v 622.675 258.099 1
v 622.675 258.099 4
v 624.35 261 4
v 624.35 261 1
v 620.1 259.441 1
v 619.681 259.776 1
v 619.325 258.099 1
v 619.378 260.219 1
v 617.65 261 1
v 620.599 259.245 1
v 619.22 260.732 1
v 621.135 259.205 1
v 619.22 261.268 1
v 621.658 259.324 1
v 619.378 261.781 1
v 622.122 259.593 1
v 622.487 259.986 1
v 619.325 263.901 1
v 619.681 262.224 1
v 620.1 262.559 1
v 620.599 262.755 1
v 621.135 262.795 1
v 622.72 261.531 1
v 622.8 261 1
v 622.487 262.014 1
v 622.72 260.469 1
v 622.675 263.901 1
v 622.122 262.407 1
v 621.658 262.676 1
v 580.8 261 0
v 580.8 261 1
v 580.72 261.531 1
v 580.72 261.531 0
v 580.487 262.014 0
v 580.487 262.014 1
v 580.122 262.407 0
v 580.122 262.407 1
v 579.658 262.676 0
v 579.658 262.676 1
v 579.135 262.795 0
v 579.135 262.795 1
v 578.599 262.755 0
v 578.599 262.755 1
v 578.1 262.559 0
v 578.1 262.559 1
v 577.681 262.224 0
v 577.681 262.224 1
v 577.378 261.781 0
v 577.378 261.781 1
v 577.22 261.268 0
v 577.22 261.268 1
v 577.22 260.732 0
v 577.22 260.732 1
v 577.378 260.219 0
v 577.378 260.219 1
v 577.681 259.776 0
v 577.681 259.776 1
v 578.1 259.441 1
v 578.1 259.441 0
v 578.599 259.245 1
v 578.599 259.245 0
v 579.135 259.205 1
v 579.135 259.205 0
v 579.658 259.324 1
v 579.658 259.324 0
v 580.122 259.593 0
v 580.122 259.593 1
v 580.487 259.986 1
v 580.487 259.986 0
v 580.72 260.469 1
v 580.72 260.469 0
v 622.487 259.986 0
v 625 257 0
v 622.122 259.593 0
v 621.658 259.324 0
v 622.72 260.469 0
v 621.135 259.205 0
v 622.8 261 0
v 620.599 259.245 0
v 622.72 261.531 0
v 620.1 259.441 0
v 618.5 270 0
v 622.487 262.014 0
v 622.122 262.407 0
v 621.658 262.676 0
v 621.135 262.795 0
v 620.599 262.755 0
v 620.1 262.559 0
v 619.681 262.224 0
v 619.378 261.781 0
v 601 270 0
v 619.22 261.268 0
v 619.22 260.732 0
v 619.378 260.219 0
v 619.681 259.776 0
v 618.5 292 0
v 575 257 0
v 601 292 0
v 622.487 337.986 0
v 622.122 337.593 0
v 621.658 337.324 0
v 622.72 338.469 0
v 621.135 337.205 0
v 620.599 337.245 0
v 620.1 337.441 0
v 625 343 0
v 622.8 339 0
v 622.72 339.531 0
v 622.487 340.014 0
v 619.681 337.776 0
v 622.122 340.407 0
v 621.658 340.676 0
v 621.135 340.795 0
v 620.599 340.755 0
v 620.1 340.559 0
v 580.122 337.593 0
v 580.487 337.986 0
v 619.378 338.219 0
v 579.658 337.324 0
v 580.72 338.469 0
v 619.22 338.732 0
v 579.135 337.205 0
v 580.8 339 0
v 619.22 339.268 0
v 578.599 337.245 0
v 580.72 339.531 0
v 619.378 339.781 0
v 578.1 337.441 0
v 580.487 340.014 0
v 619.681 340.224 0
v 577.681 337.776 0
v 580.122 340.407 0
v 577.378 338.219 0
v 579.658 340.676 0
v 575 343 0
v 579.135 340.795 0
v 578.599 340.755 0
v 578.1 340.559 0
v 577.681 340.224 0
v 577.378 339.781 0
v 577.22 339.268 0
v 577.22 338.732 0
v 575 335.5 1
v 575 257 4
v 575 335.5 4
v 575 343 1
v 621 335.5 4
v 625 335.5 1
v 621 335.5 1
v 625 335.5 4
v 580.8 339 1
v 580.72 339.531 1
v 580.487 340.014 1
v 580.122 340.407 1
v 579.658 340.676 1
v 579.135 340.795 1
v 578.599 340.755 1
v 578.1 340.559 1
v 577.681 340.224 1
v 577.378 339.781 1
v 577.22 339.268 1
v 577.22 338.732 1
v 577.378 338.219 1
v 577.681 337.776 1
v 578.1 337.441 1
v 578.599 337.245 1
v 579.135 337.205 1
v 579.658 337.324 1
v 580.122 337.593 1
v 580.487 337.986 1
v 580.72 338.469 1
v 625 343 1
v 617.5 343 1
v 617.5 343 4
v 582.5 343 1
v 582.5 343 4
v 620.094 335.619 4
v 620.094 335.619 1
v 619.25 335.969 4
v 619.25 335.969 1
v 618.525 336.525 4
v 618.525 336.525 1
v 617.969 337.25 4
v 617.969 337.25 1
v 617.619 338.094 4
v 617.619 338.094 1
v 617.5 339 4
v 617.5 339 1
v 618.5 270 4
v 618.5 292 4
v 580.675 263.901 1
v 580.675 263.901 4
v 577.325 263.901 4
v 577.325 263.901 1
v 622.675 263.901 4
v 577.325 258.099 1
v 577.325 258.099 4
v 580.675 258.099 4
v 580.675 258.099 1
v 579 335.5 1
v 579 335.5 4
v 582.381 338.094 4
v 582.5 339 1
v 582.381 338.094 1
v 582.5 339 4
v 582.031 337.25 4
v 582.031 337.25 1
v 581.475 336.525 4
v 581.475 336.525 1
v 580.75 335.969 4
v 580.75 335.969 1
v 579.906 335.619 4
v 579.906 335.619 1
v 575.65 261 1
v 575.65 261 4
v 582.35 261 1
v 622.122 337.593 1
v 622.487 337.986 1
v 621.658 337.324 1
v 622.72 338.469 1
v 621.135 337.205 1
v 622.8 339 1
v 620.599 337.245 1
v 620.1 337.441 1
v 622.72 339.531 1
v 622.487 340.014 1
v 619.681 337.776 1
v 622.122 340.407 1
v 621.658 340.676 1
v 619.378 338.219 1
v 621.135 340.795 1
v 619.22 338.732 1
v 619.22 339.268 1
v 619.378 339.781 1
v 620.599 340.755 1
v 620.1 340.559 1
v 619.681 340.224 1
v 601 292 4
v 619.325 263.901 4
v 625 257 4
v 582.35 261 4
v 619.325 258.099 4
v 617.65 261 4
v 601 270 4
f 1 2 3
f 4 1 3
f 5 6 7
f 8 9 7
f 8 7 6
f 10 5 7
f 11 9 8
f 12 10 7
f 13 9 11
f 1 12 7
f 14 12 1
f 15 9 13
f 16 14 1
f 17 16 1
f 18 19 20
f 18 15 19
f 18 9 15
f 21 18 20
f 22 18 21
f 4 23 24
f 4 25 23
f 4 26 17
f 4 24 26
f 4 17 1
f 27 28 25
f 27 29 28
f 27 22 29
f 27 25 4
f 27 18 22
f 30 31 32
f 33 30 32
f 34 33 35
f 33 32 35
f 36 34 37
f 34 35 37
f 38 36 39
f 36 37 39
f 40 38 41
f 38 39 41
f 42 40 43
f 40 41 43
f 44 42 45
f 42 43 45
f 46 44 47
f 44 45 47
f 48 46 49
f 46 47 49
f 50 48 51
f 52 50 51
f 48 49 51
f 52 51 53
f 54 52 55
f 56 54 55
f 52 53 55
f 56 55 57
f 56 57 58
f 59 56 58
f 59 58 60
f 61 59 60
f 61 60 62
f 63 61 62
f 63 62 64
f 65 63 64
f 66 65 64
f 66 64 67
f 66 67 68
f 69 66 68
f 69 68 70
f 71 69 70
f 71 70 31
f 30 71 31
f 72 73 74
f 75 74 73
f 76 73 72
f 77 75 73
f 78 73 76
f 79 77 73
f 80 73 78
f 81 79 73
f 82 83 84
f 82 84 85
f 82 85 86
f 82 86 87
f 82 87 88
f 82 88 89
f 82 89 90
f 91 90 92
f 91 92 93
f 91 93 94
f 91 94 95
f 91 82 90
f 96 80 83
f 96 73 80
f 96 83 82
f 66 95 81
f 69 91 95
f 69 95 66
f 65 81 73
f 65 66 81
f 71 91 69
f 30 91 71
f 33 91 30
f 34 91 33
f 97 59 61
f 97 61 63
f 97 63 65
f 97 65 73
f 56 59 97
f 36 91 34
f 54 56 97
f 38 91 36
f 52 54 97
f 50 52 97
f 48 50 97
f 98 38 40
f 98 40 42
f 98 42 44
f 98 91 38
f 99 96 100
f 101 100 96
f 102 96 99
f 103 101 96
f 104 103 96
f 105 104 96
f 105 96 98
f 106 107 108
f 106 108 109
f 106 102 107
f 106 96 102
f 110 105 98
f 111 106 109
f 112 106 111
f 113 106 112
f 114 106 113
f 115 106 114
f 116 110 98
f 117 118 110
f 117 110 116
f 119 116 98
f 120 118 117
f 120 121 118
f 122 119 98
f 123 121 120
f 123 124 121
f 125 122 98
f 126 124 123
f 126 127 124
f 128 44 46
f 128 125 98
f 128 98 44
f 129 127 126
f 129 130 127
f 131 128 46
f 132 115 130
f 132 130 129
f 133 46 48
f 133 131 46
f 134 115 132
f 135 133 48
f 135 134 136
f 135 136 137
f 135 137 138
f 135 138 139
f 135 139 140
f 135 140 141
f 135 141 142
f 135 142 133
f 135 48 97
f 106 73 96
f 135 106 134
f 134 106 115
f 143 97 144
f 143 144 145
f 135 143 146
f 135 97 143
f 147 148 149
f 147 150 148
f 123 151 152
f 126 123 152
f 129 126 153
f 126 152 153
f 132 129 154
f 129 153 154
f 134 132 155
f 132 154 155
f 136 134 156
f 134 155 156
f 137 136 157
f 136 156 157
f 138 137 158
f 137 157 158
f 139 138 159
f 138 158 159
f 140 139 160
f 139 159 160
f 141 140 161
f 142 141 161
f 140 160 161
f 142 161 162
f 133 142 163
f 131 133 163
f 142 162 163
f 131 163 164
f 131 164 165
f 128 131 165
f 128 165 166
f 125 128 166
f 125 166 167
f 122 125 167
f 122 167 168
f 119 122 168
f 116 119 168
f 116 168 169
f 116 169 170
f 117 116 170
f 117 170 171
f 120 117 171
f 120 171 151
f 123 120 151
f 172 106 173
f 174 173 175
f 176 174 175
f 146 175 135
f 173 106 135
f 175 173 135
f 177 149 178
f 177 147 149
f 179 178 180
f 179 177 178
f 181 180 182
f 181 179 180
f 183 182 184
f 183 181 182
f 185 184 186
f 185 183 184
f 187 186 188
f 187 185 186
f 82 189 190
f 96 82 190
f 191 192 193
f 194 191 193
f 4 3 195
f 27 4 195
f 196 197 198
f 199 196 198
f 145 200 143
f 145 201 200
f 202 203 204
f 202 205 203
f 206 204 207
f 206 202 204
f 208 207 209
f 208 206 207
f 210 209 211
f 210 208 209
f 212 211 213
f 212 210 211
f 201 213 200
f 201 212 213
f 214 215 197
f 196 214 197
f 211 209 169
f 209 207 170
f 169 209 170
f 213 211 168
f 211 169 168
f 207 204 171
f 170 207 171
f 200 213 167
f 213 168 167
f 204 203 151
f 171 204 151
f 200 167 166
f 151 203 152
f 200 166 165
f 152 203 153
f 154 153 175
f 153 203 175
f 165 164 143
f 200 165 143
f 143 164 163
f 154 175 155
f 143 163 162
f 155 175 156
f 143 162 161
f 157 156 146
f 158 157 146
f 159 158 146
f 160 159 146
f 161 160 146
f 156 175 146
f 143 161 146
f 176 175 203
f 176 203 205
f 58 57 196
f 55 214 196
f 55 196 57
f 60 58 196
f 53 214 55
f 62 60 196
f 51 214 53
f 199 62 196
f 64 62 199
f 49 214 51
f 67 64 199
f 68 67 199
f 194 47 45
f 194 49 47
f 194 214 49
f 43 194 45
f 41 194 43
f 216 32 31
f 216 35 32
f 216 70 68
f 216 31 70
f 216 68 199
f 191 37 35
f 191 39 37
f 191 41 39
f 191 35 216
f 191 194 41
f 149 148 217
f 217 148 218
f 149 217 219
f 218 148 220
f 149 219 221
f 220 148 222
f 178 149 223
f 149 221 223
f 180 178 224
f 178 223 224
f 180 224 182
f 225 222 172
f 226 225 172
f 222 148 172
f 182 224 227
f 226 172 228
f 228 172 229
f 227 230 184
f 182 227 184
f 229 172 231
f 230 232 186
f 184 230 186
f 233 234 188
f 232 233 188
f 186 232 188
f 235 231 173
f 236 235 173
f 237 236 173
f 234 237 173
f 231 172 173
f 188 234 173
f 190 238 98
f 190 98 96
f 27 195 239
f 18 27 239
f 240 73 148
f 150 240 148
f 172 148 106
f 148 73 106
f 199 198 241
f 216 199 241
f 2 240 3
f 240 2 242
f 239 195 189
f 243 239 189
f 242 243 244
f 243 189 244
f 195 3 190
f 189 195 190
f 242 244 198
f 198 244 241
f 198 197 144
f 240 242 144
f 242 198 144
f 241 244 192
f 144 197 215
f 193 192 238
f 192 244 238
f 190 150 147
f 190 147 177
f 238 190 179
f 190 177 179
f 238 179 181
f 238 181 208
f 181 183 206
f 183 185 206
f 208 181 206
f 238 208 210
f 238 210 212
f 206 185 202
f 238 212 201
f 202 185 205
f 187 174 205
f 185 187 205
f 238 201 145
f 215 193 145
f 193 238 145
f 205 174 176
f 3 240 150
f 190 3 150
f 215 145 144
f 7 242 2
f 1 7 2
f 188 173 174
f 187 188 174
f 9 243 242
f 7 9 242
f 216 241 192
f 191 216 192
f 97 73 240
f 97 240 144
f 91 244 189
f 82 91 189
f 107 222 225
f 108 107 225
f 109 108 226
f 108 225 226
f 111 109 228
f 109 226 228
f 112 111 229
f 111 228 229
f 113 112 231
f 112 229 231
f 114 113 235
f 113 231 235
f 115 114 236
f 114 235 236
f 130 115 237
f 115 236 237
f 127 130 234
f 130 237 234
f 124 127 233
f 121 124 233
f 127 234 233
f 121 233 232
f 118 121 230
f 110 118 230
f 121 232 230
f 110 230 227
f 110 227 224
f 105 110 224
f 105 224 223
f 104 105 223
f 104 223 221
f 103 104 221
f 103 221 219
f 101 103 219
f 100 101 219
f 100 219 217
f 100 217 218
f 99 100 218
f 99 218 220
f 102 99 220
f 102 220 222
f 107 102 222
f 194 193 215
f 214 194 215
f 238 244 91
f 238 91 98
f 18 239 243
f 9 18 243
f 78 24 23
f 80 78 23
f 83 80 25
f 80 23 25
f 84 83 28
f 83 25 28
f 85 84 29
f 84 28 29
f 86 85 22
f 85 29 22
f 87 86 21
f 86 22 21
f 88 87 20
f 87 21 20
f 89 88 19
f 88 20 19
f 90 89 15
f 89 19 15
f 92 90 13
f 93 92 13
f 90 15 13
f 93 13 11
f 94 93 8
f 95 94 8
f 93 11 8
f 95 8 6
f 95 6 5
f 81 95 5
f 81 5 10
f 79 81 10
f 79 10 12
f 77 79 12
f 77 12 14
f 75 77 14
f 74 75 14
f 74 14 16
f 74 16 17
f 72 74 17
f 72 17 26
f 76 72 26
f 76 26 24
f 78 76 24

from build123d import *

# Parameters (mm, degrees)
SKETCH_1_W                  = 50
SKETCH_1_H                  = 86
EXTRUDE_1_DEPTH             = 4
SKETCH_2_W                  = 17.5
SKETCH_2_H                  = 22
CUT_EXTRUDE_1_DEPTH         = 5
CUT_EXTRUDE_2_DEPTH         = 3
SKETCH_4_W                  = 7.5
SKETCH_4_H                  = 3
CUT_EXTRUDE_3_DEPTH         = 7.5
SKETCH_5_W                  = 7.5
SKETCH_5_H                  = 3
CUT_EXTRUDE_4_DEPTH         = 7.5
CUT_EXTRUDE_5_DEPTH         = 3
HOLE_WIZARD_3_6_3_6_1_D     = 3.6
HOLE_WIZARD_3_6_3_6_1_DEPTH = 4
FILLET_1_R                  = 3.5


with BuildPart() as part:
    # 草图1 → 凸台-拉伸1 (new body)
    with BuildSketch(Plane(origin=(0, 0, 0), x_dir=(-1, 0, 0), z_dir=(0, 0, -1))):
        with Locations((-600, 300)):
            Rectangle(SKETCH_1_W, SKETCH_1_H)
    extrude(amount=-EXTRUDE_1_DEPTH)

    # 草图2 → 切除-拉伸1 (cut, through all)
    with BuildSketch(Plane.XY.offset(4)):
        with Locations((609.75, 281)):
            Rectangle(SKETCH_2_W, SKETCH_2_H)
    extrude(amount=-CUT_EXTRUDE_1_DEPTH, mode=Mode.SUBTRACT)

    # 草图3 → 切除-拉伸2 (cut)
    with BuildSketch(Plane.XY.offset(4)):
        Polygon((580.675, 258.098814897), (582.35, 261), (580.675, 263.901185103), (577.325, 263.901185103), (575.65, 261), (577.325, 258.098814897), align=None)
    extrude(amount=-CUT_EXTRUDE_2_DEPTH, mode=Mode.SUBTRACT)

    # 草图4 → 切除-拉伸3 (cut)
    with BuildSketch(Plane(origin=(0, 343, 0), x_dir=(-1, 0, 0), z_dir=(0, 1, 0))):
        with Locations((-578.75, 2.5)):
            Rectangle(SKETCH_4_W, SKETCH_4_H)
    extrude(amount=-CUT_EXTRUDE_3_DEPTH, mode=Mode.SUBTRACT)

    # 草图5 → 切除-拉伸4 (cut)
    with BuildSketch(Plane(origin=(0, 343, 0), x_dir=(-1, 0, 0), z_dir=(0, 1, 0))):
        with Locations((-621.25, 2.5)):
            Rectangle(SKETCH_5_W, SKETCH_5_H)
    extrude(amount=-CUT_EXTRUDE_4_DEPTH, mode=Mode.SUBTRACT)

    # 草图6 → 切除-拉伸5 (cut)
    with BuildSketch(Plane.XY.offset(4)):
        Polygon((624.35, 261), (622.675, 263.901185103), (619.325, 263.901185103), (617.65, 261), (619.325, 258.098814897), (622.675, 258.098814897), align=None)
    extrude(amount=-CUT_EXTRUDE_5_DEPTH, mode=Mode.SUBTRACT)

    # Ø3.6 (3.6) 直径孔1
    with Locations(Plane(origin=(0, 0, 0), x_dir=(-1, 0, 0), z_dir=(0, 0, -1))):
        with Locations((-579, 339), (-621, 339), (-579, 261), (-621, 261)):
            Hole(HOLE_WIZARD_3_6_3_6_1_D / 2, depth=HOLE_WIZARD_3_6_3_6_1_DEPTH)

    # 圆角1
    fillet_1_edges = [part.edges().sort_by_distance(p)[0] for p in [
        (582.5, 335.5, 2.5),
        (617.5, 335.5, 2.5),
    ]]
    fillet(fillet_1_edges, radius=FILLET_1_R)


solid = part.part
